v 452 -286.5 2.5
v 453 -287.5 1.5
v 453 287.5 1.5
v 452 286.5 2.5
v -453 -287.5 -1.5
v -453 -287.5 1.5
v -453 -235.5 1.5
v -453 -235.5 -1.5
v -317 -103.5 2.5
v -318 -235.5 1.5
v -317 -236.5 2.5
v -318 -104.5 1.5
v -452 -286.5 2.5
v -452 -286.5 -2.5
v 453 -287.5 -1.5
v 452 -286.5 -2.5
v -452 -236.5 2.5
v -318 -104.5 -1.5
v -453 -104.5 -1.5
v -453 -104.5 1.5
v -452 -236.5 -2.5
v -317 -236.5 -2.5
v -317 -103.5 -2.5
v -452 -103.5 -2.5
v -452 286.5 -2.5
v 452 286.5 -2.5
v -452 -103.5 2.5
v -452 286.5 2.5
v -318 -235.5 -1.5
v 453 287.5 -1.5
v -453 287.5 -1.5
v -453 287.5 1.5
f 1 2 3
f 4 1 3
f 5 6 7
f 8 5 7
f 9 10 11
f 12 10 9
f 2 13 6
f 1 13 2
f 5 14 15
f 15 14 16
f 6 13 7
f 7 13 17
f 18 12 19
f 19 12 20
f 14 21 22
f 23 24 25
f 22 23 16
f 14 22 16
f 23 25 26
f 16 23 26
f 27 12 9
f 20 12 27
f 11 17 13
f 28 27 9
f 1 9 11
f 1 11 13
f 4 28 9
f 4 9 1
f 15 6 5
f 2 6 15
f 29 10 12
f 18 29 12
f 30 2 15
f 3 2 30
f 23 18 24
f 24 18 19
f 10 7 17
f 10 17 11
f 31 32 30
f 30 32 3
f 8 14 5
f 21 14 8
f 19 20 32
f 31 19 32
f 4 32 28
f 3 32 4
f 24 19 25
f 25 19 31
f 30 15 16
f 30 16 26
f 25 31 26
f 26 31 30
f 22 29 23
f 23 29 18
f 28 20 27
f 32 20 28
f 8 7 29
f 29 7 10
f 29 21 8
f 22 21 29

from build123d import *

# Parameters (mm, degrees)
F0_W     = 906
F0_H     = 575
F1_DEPTH = 2.5
F2_W     = 1
F2_H     = 131
F2_W_2   = 135
F3_DEPTH = 5.001
F4_SIZE  = 1


with BuildPart() as f1:
    # F0 (on Top) → F1 (new body, symmetric)
    with BuildSketch(Plane.XY):
        Rectangle(F0_W, F0_H)
    extrude(amount=F1_DEPTH, both=True)

    # F2 (on face) → F3 (cut, through all)
    with BuildSketch(Plane.XY.offset(2.5)):
        with Locations((-453.5, -170)):
            Rectangle(F2_W, F2_H)
        with Locations((-385.5, -170)):
            Rectangle(F2_W_2, F2_H)
    extrude(amount=-F3_DEPTH, mode=Mode.SUBTRACT)

    # F4
    f4_edges = [f1.edges().sort_by_distance(p)[0] for p in [
        (-453, 91.5, 2.5),
        (-453, 91.5, -2.5),
        (-453, -261.5, -2.5),
        (-453, -261.5, 2.5),
        (0, -287.5, -2.5),
        (0, -287.5, 2.5),
        (453, 0, 2.5),
        (453, 0, -2.5),
        (0, 287.5, 2.5),
        (0, 287.5, -2.5),
        (-385.5, -104.5, 2.5),
        (-385.5, -104.5, -2.5),
        (-318, -170, -2.5),
        (-318, -170, 2.5),
        (-385.5, -235.5, 2.5),
        (-385.5, -235.5, -2.5),
    ]]
    chamfer(f4_edges, length=F4_SIZE)


solid = f1.part
